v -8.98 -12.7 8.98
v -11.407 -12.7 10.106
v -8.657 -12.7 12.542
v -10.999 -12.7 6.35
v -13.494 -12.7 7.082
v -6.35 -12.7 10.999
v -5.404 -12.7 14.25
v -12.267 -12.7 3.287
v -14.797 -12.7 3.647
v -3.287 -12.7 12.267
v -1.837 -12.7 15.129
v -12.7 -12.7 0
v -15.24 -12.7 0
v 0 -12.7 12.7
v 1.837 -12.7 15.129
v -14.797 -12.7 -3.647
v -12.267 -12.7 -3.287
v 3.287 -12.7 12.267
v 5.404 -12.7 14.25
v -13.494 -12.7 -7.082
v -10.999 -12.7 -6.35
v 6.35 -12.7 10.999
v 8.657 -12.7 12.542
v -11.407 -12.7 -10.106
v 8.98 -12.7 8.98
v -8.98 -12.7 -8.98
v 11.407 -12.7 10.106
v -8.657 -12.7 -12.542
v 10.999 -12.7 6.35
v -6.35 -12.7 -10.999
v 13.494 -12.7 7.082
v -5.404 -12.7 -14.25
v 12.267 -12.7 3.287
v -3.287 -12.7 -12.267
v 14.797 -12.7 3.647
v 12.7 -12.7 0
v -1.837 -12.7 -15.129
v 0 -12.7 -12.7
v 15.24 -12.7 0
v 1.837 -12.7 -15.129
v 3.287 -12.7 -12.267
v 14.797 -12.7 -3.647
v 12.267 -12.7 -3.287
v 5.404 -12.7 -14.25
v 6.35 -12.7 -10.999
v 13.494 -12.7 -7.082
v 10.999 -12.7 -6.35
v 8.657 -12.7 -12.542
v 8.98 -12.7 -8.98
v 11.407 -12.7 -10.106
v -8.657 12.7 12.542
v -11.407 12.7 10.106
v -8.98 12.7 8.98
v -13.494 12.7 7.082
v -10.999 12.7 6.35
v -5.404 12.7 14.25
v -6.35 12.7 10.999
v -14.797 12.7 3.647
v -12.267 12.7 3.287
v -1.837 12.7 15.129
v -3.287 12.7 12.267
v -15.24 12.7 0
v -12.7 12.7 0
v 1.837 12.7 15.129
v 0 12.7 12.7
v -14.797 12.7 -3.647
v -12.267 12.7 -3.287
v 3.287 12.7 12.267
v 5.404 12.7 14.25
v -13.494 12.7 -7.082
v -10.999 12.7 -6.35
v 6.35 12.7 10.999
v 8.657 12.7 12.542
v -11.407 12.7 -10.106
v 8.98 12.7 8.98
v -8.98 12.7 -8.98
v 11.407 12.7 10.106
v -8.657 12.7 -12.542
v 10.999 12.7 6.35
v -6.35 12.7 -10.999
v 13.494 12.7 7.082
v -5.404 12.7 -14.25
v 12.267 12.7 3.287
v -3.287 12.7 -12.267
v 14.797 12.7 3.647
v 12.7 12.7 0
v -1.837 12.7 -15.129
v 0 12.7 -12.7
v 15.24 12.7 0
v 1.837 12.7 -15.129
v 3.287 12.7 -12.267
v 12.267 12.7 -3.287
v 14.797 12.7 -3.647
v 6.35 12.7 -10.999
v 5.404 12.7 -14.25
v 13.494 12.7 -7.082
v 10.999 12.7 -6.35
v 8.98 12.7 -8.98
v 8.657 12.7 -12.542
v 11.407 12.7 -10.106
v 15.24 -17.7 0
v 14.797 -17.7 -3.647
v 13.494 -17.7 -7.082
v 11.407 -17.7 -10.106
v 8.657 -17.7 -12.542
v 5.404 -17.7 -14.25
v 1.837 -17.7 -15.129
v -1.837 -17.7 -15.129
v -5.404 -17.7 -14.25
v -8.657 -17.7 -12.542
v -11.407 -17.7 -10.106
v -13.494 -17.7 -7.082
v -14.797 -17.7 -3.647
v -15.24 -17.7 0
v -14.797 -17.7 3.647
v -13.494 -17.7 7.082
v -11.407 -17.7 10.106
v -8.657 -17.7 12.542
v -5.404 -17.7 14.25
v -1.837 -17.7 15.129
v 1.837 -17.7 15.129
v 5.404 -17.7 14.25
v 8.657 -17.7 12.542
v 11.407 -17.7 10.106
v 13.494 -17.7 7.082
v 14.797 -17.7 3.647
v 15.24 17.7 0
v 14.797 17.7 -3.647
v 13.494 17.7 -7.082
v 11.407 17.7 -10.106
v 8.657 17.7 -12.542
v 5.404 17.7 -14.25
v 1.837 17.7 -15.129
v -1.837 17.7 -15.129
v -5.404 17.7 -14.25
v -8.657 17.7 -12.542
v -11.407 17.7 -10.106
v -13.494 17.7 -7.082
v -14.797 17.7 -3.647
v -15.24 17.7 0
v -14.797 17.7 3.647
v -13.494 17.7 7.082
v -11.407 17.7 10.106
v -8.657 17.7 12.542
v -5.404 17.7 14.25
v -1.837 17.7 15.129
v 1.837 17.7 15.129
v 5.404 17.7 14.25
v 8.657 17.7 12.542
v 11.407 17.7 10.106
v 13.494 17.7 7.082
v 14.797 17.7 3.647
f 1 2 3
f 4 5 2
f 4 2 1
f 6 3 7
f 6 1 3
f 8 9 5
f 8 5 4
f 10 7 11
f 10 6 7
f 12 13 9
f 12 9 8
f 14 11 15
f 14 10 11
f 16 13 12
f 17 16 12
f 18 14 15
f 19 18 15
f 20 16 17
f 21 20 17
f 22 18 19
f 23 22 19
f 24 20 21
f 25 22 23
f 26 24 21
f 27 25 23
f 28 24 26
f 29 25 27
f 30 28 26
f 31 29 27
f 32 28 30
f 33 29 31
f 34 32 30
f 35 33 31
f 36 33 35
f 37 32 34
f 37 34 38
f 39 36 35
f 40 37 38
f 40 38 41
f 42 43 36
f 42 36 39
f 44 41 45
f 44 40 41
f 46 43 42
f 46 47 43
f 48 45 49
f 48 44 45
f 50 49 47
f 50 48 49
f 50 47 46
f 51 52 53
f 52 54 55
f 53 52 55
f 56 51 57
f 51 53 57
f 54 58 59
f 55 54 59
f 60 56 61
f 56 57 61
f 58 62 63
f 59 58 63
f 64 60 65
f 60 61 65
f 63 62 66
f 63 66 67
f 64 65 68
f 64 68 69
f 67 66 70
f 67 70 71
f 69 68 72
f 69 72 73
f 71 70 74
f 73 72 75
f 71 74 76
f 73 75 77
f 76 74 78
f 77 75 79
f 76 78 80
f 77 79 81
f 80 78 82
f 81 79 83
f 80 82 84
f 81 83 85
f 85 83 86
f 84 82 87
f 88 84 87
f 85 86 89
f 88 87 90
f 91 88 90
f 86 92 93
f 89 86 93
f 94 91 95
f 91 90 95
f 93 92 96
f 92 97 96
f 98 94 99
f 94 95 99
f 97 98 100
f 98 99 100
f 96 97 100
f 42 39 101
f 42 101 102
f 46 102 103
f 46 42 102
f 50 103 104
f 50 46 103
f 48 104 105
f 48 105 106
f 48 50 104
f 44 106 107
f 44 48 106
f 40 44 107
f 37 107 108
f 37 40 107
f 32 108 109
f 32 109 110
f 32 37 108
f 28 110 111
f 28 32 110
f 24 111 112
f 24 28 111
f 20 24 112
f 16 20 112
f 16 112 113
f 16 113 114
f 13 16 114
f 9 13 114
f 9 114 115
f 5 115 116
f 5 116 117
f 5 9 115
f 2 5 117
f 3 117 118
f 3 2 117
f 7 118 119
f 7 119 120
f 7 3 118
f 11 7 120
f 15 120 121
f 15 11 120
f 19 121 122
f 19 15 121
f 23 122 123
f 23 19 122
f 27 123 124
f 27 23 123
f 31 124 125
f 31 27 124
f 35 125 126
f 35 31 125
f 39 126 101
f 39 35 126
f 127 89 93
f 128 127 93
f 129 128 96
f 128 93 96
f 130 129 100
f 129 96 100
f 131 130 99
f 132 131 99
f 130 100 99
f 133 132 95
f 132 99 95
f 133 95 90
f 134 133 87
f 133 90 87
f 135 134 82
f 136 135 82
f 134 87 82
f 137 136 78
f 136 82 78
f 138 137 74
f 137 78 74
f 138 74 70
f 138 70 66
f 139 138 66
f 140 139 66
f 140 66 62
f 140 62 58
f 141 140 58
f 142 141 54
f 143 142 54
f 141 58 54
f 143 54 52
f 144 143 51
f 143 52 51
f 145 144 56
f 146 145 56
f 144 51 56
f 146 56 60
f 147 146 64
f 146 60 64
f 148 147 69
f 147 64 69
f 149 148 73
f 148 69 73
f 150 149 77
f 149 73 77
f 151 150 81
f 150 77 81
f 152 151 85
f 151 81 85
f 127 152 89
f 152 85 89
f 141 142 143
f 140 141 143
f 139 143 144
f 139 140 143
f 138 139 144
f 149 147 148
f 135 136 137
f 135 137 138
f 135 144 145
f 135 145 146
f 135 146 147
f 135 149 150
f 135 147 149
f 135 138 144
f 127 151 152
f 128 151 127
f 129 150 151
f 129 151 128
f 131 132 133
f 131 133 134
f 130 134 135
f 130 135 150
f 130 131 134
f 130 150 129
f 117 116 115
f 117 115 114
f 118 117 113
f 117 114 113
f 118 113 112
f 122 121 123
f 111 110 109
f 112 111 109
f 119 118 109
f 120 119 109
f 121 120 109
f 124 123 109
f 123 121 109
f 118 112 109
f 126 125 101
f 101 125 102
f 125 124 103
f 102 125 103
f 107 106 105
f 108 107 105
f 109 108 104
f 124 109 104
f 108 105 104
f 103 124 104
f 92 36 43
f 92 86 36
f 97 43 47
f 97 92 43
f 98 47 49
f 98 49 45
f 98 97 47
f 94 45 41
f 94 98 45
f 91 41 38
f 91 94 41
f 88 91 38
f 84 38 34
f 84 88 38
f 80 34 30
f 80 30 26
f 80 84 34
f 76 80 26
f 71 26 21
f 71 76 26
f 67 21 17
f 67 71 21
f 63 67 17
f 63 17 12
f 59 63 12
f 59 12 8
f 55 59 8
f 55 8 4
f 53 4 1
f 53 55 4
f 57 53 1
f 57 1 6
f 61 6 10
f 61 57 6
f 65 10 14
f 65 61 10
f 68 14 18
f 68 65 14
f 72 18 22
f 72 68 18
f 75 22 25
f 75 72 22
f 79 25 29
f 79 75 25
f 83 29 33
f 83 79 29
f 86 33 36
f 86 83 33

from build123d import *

# Parameters (mm, degrees)
SKETCH1_R           = 12.7
BOSS_EXTRUDE1_DEPTH = 12.7
SKETCH2_R           = 15.24
BOSS_EXTRUDE2_DEPTH = 5


with BuildPart() as part:
    # Sketch1 → Boss-Extrude1 (new body, symmetric)
    with BuildSketch(Plane(origin=(0, 0, 0), x_dir=(1, 0, 0), z_dir=(0, 1, 0))):
        Circle(SKETCH1_R)
    extrude(amount=BOSS_EXTRUDE1_DEPTH, both=True)

    # Sketch2 → Boss-Extrude2 (add)
    with BuildSketch(Plane(origin=(0, 12.7, 0), x_dir=(1, 0, 0), z_dir=(0, 1, 0))):
        Circle(SKETCH2_R)
    boss_extrude2 = extrude(amount=BOSS_EXTRUDE2_DEPTH)

    # Mirror1: Boss-Extrude2 across plane
    add(boss_extrude2.mirror(Plane.ZX))


solid = part.part
